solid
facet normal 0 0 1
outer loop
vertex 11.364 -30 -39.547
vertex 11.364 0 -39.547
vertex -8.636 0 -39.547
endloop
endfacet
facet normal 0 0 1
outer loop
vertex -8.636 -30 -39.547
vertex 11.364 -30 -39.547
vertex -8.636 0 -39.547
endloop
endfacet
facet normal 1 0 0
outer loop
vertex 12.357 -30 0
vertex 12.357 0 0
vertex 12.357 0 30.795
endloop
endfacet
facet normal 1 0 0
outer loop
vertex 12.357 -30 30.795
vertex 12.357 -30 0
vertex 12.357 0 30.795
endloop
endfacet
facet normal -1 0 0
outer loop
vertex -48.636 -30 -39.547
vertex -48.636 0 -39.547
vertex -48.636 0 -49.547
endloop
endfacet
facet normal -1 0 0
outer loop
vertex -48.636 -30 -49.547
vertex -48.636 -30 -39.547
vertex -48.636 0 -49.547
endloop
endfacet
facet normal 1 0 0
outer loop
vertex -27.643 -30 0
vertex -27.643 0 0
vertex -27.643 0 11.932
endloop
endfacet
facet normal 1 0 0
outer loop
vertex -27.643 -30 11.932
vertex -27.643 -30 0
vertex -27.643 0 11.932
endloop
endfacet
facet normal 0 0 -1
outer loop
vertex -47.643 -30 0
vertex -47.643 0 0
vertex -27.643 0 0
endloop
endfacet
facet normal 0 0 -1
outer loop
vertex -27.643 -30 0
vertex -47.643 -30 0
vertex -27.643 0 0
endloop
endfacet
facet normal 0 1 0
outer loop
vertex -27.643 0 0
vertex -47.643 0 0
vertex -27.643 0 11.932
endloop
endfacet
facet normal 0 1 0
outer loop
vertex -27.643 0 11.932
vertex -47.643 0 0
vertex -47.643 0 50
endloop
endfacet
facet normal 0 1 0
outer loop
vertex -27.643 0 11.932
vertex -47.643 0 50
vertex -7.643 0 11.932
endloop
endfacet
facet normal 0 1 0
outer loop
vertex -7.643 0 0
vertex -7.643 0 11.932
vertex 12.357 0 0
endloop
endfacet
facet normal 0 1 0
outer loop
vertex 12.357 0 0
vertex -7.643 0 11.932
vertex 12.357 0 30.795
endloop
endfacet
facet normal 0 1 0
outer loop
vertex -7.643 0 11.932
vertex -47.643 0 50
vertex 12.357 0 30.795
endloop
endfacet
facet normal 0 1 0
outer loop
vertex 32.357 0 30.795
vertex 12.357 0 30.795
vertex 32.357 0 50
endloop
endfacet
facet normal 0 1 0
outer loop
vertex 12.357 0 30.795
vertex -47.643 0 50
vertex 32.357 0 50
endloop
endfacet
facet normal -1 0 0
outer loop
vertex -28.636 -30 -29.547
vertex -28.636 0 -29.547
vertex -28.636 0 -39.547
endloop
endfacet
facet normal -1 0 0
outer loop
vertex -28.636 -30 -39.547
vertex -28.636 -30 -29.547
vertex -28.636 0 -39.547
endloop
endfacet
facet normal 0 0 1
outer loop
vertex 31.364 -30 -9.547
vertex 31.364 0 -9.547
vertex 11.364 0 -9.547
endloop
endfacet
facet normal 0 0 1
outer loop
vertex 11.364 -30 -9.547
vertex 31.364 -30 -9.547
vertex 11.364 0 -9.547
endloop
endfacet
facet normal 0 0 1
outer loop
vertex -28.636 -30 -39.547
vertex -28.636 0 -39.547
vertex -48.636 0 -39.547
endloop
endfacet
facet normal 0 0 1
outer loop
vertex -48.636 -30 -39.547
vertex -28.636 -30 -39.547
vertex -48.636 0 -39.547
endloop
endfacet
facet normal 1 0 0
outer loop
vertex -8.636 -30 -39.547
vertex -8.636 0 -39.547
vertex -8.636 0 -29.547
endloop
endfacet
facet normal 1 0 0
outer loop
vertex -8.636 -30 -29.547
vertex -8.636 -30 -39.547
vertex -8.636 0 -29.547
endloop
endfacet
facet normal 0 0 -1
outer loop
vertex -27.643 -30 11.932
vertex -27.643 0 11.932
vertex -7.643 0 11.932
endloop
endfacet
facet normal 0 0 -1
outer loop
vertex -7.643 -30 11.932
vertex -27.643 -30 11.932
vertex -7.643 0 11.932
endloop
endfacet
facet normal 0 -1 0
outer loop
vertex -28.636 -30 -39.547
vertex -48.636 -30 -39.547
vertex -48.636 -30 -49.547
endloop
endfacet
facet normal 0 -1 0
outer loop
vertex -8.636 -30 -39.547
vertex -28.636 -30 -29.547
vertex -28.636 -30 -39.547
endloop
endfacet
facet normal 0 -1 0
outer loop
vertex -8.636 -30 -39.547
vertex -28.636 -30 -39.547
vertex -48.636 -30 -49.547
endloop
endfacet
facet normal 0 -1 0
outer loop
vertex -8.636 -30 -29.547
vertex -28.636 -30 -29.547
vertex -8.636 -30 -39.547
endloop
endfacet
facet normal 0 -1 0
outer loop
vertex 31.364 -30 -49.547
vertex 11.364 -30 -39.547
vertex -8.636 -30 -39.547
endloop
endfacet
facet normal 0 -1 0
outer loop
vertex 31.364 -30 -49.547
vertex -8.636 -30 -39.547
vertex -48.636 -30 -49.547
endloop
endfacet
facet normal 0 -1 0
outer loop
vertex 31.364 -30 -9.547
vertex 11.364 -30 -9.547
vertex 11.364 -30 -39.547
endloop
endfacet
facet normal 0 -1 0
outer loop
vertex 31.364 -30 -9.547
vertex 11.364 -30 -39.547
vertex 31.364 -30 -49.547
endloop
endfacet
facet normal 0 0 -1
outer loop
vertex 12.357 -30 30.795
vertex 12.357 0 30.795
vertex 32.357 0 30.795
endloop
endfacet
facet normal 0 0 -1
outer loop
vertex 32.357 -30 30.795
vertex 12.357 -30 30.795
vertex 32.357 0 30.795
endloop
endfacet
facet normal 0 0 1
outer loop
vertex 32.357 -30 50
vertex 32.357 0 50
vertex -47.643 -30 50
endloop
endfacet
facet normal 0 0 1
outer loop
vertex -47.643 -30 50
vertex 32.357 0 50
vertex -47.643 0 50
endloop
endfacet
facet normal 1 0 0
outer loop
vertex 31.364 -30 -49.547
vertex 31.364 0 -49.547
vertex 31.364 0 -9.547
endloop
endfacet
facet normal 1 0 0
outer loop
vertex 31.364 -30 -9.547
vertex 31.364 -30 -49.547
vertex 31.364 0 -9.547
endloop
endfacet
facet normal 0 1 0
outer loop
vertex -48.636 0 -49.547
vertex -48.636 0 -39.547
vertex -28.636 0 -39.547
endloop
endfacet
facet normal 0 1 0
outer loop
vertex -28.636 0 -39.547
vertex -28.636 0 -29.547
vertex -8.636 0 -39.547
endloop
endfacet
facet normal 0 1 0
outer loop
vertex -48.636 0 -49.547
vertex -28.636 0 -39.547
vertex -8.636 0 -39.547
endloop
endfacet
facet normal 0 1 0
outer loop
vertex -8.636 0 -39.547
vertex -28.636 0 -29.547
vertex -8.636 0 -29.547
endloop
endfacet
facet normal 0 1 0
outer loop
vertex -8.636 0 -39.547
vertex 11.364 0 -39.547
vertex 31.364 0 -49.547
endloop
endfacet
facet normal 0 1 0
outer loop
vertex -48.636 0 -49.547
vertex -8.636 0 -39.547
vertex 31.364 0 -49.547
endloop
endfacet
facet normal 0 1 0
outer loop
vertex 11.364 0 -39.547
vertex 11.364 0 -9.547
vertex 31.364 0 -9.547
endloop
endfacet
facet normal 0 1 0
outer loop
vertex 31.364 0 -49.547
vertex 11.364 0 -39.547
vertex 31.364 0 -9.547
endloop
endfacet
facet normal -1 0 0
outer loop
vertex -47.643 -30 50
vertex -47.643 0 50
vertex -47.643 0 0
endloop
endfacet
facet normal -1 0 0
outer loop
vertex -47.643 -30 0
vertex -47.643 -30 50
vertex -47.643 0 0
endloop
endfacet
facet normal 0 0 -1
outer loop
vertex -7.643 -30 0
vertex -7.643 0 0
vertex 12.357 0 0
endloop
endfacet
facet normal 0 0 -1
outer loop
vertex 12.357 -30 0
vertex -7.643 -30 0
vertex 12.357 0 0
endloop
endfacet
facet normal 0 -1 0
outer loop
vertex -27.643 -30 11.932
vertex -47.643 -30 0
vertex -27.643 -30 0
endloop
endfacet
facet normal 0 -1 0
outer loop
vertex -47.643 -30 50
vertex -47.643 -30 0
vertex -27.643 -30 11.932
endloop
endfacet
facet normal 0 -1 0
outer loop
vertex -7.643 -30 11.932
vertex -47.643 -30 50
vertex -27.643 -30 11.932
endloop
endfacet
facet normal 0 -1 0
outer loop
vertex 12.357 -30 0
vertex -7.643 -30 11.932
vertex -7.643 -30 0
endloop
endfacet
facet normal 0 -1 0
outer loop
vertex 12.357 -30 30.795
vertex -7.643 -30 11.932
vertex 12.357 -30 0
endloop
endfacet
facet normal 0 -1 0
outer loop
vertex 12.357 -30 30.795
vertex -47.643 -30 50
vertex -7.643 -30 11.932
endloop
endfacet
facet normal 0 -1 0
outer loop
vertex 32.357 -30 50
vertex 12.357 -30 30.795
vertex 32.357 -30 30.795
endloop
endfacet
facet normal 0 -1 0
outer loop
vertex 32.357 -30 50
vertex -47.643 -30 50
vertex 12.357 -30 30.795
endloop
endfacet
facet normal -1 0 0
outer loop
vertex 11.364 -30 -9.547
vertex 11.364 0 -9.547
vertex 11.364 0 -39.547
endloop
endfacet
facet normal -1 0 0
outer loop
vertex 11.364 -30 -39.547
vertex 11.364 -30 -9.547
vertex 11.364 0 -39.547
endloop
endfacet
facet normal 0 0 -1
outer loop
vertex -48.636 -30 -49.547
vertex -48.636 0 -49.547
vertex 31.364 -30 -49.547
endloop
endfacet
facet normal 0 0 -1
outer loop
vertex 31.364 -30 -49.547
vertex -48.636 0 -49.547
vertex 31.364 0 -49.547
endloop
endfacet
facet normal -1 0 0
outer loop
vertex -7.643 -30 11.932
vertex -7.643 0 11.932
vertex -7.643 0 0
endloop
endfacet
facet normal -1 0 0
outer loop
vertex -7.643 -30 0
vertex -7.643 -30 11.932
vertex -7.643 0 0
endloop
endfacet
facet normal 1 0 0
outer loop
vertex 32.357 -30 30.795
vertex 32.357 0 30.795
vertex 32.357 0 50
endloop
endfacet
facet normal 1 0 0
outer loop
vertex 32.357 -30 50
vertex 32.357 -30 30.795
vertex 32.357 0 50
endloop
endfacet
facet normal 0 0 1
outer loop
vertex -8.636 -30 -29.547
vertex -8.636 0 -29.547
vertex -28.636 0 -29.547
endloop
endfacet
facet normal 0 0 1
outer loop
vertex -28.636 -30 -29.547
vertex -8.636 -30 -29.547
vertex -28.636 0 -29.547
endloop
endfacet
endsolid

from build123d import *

# Parameters (mm, degrees)
F1_DEPTH = 30
F3_DEPTH = 30


with BuildPart() as f1:
    # F0 (on Front) → F1 (new body)
    with BuildSketch(Plane.XZ):
        Polygon((32.357318, 50), (-47.642682, 50), (-47.642682, 0), (-27.642682, 0), (-27.642682, 11.931819), (-7.642682, 11.931819), (-7.642682, 0), (12.357318, 0), (12.357318, 30.795455), (32.357318, 30.795455), align=None)
    extrude(amount=F1_DEPTH)


with BuildPart() as f3:
    # F2 (on Front) → F3 (new body)
    with BuildSketch(Plane.XZ):
        Polygon((31.363637, -9.547402), (11.363637, -9.547402), (11.363637, -39.547402), (-8.636363, -39.547402), (-8.636363, -29.547402), (-28.636363, -29.547402), (-28.636363, -39.547402), (-48.636363, -39.547402), (-48.636363, -49.547402), (31.363637, -49.547402), align=None)
    extrude(amount=F3_DEPTH)


solid = Compound([f1.part, f3.part])
